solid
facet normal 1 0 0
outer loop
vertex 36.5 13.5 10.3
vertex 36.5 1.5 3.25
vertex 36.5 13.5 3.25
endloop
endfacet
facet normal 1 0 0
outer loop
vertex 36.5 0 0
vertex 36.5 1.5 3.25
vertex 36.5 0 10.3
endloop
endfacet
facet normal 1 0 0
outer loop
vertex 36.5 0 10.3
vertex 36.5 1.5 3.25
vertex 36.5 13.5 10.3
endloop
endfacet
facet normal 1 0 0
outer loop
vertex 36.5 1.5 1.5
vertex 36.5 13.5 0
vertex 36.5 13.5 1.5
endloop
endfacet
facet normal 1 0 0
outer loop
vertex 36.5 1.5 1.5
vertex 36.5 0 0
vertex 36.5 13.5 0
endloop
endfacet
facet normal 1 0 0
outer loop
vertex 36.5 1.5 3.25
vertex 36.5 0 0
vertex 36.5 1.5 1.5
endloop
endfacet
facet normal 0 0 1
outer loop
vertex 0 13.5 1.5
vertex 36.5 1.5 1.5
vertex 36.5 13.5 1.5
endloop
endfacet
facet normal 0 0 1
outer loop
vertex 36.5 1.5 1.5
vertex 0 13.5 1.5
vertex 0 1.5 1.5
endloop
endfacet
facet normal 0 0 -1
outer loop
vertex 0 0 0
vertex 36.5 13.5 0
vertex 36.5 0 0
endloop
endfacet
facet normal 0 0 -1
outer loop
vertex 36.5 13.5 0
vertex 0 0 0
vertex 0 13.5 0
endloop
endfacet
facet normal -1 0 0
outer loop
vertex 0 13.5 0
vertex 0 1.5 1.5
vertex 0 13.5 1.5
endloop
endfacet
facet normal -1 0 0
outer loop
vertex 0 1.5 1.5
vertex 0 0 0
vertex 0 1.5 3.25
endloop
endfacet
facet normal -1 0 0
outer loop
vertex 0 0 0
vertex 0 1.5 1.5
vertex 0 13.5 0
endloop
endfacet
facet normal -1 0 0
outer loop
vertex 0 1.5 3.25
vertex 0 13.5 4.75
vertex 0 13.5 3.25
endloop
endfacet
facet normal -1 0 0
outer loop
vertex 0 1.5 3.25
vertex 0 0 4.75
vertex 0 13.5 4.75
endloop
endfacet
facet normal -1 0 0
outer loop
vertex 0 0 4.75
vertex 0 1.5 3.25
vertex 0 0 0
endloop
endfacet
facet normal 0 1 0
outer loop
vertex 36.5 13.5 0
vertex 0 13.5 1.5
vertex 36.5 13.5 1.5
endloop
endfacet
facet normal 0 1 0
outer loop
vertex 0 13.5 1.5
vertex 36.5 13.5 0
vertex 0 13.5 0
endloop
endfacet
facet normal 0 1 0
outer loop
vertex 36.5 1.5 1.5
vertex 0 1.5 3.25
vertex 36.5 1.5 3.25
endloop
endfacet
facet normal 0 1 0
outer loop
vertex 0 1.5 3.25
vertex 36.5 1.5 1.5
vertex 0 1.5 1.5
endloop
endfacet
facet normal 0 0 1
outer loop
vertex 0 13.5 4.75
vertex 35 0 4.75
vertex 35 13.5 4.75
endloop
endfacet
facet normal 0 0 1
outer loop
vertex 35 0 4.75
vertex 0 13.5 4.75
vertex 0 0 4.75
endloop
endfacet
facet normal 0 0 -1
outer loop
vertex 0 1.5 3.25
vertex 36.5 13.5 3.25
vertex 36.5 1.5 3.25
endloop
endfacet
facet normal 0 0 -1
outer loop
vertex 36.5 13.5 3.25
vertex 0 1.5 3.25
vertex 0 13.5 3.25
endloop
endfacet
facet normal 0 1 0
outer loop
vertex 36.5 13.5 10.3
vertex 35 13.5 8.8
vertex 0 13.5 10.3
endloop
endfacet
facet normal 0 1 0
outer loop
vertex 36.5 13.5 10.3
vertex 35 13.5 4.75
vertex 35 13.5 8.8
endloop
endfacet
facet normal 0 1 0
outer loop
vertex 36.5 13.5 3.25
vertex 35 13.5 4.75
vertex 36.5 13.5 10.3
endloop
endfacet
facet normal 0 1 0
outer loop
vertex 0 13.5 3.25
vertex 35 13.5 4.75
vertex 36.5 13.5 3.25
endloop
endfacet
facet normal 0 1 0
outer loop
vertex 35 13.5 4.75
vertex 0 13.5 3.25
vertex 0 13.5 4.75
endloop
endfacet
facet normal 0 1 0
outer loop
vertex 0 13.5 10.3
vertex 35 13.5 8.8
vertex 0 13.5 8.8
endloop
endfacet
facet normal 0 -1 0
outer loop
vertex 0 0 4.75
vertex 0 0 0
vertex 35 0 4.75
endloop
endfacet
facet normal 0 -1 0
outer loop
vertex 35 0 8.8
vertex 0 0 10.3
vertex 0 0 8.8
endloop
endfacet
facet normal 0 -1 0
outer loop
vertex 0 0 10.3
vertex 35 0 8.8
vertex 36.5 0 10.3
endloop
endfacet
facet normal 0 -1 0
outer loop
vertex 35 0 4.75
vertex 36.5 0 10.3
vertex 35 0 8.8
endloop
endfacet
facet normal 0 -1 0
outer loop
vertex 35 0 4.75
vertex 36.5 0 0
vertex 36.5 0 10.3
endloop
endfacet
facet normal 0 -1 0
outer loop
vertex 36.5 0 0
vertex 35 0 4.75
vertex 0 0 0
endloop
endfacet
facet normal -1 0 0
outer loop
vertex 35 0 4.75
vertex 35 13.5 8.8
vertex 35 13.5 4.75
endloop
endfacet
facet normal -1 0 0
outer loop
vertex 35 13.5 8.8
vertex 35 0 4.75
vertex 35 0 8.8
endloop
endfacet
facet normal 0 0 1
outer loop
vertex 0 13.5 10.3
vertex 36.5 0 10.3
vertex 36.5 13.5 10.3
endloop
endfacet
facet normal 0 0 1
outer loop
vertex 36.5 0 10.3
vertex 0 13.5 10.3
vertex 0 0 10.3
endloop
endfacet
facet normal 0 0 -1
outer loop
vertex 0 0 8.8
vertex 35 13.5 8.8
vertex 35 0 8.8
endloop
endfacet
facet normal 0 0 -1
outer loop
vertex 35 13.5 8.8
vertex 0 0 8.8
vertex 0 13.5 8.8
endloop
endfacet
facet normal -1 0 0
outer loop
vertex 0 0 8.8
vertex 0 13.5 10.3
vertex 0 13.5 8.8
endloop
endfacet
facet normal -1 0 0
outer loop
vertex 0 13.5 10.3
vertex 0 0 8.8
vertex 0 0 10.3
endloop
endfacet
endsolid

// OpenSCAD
tolerence = 0.0;
thickness = 1.5;
width = 12;
pi_gap = 1.75;
bracket_gap = 4.05;
angle = 90;
top_depth = 35;

depth = width;
t_pi_gap = pi_gap + tolerence;
t_bracket_gap = bracket_gap + tolerence;

module clip(width, depth, gap, thickness) {
    cube([width, thickness, gap + thickness * 2]);
    translate([0, thickness, 0]) {
        cube([width, depth, thickness]);
        translate([0, 0, thickness + gap]) cube([width, depth, thickness]);
    }
}

union() {
    //Pi
    clip(top_depth+thickness, depth, t_pi_gap, thickness);
    
    xTrans = (depth +thickness)/2;
    yTrans = (top_depth + thickness)/2;
    zTrans = t_pi_gap + thickness;

    // Bracket
    translate([yTrans, xTrans, zTrans])
    rotate([0, 0, angle])
    translate([-xTrans, -yTrans, 0])
    clip(width+thickness, top_depth, t_bracket_gap, thickness);
}
